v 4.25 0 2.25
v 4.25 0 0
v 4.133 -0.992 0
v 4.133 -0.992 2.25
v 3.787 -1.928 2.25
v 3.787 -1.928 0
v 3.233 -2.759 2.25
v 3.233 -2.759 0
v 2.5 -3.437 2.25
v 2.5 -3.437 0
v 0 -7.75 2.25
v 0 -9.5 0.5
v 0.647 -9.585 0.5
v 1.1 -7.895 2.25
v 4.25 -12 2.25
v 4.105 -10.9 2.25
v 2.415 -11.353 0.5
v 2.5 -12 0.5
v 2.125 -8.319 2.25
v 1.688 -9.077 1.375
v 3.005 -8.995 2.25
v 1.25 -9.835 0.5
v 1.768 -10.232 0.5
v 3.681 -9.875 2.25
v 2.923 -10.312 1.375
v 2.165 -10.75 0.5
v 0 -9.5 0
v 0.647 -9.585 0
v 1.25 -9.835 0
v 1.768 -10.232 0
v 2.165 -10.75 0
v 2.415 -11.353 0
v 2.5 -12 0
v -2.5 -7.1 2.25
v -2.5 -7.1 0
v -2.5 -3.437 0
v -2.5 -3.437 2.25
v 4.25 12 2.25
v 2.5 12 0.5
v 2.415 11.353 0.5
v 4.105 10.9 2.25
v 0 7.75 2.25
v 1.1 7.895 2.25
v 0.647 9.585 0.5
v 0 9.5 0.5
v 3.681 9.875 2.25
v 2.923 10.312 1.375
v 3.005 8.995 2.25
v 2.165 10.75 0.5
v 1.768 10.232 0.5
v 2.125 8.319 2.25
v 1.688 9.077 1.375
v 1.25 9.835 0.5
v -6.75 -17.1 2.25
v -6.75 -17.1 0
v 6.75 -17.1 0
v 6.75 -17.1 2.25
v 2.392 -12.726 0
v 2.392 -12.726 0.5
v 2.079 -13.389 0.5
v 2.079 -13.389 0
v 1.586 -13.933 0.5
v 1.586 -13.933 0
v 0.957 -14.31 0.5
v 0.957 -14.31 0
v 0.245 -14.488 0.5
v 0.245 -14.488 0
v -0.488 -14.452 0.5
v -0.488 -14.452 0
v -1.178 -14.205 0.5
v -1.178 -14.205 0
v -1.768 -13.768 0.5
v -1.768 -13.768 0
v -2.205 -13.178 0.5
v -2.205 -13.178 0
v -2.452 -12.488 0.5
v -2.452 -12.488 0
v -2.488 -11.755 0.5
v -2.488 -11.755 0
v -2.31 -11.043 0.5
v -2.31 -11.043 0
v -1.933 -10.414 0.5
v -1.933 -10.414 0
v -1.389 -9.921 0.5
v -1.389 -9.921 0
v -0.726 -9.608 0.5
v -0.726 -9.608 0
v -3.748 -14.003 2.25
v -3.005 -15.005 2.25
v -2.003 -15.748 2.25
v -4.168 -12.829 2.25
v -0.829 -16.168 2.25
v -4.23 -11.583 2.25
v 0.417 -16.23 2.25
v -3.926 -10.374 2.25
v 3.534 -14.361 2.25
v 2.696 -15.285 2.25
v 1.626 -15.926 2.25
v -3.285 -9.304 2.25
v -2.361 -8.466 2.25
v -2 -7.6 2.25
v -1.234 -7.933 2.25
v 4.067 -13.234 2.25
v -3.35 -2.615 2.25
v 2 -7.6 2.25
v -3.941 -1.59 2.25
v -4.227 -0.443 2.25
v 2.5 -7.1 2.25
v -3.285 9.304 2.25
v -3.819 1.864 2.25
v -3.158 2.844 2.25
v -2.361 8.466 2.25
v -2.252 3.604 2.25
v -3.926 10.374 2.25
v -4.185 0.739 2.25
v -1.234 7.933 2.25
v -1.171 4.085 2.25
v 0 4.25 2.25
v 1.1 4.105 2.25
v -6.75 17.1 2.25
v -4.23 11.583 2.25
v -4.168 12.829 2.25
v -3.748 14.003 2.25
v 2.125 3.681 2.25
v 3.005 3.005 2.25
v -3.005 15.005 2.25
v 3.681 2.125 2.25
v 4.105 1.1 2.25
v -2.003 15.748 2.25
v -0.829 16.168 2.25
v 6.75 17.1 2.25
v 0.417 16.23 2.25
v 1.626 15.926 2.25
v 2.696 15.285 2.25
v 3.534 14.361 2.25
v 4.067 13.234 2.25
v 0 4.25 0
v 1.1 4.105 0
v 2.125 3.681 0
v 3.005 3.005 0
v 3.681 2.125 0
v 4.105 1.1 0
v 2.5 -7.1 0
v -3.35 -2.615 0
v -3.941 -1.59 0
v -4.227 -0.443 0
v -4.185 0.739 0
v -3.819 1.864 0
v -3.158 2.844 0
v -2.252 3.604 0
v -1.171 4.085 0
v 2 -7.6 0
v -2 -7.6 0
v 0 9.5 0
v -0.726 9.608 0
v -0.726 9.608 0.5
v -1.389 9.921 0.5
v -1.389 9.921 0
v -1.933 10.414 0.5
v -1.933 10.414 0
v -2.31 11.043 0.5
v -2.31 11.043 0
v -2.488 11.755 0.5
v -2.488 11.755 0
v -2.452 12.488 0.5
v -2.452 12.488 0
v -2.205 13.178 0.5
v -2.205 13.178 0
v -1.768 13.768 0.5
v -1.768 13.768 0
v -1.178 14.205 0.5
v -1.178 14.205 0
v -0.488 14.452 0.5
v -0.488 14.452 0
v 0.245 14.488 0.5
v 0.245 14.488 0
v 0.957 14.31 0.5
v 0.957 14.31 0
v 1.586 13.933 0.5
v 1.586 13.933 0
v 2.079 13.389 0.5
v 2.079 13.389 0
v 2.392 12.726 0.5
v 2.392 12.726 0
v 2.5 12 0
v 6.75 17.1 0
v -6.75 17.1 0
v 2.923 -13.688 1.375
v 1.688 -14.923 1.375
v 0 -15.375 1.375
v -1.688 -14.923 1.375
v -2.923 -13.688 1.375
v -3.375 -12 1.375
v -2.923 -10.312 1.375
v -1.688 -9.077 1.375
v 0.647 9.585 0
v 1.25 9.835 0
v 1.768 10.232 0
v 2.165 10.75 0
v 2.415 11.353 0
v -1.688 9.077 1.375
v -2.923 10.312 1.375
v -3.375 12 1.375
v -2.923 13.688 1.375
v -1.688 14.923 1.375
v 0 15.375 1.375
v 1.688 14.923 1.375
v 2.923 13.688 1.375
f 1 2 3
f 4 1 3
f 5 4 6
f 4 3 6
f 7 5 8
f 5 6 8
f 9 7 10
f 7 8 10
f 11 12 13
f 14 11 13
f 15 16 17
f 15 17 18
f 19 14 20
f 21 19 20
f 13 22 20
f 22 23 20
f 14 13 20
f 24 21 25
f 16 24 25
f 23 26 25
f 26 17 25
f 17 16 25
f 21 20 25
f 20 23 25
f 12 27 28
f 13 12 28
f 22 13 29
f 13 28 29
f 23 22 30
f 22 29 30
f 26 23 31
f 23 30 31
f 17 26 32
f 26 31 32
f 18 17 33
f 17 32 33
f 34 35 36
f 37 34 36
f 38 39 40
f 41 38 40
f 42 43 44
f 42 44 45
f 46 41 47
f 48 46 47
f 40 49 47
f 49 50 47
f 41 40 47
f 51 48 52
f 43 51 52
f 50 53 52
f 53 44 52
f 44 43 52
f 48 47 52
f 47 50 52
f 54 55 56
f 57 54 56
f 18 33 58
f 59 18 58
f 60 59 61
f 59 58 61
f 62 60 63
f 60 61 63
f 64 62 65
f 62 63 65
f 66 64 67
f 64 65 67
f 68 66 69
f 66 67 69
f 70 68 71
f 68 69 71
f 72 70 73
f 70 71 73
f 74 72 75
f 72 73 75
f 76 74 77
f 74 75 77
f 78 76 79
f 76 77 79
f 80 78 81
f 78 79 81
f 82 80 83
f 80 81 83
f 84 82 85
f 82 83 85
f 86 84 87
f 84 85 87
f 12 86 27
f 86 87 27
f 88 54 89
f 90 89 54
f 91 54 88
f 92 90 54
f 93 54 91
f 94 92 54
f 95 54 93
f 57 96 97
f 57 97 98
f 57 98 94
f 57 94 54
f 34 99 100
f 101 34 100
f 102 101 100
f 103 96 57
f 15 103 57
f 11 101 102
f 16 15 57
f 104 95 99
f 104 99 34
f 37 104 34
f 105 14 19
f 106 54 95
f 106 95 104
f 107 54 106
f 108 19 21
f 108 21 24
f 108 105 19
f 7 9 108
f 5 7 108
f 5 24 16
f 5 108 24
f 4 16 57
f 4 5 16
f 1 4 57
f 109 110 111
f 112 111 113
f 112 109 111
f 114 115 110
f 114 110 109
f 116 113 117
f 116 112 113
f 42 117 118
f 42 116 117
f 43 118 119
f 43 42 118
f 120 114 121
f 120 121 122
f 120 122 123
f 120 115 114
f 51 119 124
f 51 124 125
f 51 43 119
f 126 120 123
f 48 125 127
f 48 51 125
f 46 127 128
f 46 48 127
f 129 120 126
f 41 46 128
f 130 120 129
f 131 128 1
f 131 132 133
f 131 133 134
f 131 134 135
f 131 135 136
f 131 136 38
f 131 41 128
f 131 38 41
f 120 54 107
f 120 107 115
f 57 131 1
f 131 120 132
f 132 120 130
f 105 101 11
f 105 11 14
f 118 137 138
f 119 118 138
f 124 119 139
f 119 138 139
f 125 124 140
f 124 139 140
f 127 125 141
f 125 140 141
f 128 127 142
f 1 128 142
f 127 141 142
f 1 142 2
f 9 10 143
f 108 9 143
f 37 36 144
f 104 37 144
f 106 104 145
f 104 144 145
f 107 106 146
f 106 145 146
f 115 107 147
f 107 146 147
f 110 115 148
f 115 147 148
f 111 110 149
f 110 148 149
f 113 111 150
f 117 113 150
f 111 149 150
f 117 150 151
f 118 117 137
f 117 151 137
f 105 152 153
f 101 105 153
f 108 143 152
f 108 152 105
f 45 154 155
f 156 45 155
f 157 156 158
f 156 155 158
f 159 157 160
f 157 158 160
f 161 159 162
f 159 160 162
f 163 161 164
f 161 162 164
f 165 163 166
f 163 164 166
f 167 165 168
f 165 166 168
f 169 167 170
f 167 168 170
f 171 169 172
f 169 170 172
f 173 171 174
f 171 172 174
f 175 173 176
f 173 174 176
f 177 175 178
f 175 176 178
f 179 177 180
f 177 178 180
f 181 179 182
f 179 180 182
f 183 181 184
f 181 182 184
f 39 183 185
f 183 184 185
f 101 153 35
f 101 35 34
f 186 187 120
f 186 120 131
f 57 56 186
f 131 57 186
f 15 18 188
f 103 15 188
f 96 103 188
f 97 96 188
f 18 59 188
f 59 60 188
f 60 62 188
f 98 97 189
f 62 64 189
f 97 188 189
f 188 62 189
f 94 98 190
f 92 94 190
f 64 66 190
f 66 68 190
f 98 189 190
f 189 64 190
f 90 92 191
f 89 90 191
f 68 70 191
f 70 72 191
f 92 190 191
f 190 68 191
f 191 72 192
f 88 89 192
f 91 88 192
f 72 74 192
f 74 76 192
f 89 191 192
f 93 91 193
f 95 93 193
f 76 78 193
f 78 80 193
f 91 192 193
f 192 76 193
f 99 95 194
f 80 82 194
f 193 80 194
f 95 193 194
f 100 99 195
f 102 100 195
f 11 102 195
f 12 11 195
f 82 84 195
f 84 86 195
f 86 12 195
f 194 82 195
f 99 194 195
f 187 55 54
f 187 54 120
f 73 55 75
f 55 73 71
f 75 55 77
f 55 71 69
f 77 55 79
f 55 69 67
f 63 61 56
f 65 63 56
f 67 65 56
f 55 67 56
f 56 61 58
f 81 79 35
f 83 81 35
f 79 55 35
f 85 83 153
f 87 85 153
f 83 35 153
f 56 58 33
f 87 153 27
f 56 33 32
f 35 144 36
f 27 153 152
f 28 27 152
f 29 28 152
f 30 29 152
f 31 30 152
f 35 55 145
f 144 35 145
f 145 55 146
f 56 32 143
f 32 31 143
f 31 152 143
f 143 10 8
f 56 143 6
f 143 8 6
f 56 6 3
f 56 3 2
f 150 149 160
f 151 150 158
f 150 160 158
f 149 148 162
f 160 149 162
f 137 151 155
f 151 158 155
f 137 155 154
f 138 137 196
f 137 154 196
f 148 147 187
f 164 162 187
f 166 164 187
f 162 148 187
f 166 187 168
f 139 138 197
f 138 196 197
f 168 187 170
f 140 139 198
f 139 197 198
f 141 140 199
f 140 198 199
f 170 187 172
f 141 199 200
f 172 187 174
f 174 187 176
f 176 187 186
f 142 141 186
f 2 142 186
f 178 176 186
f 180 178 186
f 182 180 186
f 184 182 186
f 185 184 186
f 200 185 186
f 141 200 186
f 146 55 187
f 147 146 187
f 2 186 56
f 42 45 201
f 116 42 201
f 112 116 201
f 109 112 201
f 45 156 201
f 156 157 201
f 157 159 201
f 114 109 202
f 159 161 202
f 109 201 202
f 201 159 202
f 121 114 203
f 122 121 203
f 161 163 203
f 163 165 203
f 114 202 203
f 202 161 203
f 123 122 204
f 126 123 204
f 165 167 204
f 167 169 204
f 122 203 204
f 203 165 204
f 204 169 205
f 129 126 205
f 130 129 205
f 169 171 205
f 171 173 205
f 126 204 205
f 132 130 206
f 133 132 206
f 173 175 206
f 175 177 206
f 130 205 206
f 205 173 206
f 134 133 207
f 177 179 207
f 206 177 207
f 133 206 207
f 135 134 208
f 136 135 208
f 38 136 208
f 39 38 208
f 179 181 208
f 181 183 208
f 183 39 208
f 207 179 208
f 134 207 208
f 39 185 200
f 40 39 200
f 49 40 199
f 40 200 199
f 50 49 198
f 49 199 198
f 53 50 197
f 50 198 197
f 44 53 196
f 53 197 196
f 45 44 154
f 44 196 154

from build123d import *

# Parameters (mm, degrees)
F0_W     = 13.5
F0_H     = 34.2
F1_DEPTH = 2.25
F2_SIZE  = 0.5
F3_SIZE  = 1.75


with BuildPart() as f1:
    # F0 (on Top) → F1 (new body)
    with BuildSketch(Plane.XY):
        Rectangle(F0_W, F0_H)
        with BuildLine():
            ThreePointArc((2.5, -12), (-1.767766953, -13.767766953), (0, -9.5))
            ThreePointArc((0, -9.5), (1.767766953, -10.232233047), (2.5, -12))
        make_face(mode=Mode.SUBTRACT)
        with BuildLine():
            ThreePointArc((-2.5, -3.4369317712), (-4.041624675, 1.3144466464), (0, 4.25))
            ThreePointArc((0, 4.25), (3.00520382, 3.00520382), (4.25, 0))
            ThreePointArc((4.25, 0), (3.7873143519, -1.9284060776), (2.5, -3.4369317712))
            Line((2.5, -3.4369317712), (2.5, -7.6))
            Line((2.5, -7.6), (0, -7.6))
            Line((0, -7.6), (-2.5, -7.6))
            Line((-2.5, -7.6), (-2.5, -3.4369317712))
        make_face(mode=Mode.SUBTRACT)
        with BuildLine():
            ThreePointArc((2.5, 12), (1.767766953, 10.232233047), (0, 9.5))
            ThreePointArc((0, 9.5), (-1.767766953, 13.767766953), (2.5, 12))
        make_face(mode=Mode.SUBTRACT)
    extrude(amount=F1_DEPTH)

    # F2
    f2_edges = [f1.edges().sort_by_distance(p)[0] for p in [
        (-2.5, -7.6, 1.125),
        (2.5, -7.6, 1.125),
    ]]
    chamfer(f2_edges, length=F2_SIZE)

    # F3
    f3_edges = [f1.edges().sort_by_distance(p)[0] for p in [
        (0, -14.5, 2.25),
        (-2.5, 12, 2.25),
    ]]
    chamfer(f3_edges, length=F3_SIZE)


solid = f1.part
